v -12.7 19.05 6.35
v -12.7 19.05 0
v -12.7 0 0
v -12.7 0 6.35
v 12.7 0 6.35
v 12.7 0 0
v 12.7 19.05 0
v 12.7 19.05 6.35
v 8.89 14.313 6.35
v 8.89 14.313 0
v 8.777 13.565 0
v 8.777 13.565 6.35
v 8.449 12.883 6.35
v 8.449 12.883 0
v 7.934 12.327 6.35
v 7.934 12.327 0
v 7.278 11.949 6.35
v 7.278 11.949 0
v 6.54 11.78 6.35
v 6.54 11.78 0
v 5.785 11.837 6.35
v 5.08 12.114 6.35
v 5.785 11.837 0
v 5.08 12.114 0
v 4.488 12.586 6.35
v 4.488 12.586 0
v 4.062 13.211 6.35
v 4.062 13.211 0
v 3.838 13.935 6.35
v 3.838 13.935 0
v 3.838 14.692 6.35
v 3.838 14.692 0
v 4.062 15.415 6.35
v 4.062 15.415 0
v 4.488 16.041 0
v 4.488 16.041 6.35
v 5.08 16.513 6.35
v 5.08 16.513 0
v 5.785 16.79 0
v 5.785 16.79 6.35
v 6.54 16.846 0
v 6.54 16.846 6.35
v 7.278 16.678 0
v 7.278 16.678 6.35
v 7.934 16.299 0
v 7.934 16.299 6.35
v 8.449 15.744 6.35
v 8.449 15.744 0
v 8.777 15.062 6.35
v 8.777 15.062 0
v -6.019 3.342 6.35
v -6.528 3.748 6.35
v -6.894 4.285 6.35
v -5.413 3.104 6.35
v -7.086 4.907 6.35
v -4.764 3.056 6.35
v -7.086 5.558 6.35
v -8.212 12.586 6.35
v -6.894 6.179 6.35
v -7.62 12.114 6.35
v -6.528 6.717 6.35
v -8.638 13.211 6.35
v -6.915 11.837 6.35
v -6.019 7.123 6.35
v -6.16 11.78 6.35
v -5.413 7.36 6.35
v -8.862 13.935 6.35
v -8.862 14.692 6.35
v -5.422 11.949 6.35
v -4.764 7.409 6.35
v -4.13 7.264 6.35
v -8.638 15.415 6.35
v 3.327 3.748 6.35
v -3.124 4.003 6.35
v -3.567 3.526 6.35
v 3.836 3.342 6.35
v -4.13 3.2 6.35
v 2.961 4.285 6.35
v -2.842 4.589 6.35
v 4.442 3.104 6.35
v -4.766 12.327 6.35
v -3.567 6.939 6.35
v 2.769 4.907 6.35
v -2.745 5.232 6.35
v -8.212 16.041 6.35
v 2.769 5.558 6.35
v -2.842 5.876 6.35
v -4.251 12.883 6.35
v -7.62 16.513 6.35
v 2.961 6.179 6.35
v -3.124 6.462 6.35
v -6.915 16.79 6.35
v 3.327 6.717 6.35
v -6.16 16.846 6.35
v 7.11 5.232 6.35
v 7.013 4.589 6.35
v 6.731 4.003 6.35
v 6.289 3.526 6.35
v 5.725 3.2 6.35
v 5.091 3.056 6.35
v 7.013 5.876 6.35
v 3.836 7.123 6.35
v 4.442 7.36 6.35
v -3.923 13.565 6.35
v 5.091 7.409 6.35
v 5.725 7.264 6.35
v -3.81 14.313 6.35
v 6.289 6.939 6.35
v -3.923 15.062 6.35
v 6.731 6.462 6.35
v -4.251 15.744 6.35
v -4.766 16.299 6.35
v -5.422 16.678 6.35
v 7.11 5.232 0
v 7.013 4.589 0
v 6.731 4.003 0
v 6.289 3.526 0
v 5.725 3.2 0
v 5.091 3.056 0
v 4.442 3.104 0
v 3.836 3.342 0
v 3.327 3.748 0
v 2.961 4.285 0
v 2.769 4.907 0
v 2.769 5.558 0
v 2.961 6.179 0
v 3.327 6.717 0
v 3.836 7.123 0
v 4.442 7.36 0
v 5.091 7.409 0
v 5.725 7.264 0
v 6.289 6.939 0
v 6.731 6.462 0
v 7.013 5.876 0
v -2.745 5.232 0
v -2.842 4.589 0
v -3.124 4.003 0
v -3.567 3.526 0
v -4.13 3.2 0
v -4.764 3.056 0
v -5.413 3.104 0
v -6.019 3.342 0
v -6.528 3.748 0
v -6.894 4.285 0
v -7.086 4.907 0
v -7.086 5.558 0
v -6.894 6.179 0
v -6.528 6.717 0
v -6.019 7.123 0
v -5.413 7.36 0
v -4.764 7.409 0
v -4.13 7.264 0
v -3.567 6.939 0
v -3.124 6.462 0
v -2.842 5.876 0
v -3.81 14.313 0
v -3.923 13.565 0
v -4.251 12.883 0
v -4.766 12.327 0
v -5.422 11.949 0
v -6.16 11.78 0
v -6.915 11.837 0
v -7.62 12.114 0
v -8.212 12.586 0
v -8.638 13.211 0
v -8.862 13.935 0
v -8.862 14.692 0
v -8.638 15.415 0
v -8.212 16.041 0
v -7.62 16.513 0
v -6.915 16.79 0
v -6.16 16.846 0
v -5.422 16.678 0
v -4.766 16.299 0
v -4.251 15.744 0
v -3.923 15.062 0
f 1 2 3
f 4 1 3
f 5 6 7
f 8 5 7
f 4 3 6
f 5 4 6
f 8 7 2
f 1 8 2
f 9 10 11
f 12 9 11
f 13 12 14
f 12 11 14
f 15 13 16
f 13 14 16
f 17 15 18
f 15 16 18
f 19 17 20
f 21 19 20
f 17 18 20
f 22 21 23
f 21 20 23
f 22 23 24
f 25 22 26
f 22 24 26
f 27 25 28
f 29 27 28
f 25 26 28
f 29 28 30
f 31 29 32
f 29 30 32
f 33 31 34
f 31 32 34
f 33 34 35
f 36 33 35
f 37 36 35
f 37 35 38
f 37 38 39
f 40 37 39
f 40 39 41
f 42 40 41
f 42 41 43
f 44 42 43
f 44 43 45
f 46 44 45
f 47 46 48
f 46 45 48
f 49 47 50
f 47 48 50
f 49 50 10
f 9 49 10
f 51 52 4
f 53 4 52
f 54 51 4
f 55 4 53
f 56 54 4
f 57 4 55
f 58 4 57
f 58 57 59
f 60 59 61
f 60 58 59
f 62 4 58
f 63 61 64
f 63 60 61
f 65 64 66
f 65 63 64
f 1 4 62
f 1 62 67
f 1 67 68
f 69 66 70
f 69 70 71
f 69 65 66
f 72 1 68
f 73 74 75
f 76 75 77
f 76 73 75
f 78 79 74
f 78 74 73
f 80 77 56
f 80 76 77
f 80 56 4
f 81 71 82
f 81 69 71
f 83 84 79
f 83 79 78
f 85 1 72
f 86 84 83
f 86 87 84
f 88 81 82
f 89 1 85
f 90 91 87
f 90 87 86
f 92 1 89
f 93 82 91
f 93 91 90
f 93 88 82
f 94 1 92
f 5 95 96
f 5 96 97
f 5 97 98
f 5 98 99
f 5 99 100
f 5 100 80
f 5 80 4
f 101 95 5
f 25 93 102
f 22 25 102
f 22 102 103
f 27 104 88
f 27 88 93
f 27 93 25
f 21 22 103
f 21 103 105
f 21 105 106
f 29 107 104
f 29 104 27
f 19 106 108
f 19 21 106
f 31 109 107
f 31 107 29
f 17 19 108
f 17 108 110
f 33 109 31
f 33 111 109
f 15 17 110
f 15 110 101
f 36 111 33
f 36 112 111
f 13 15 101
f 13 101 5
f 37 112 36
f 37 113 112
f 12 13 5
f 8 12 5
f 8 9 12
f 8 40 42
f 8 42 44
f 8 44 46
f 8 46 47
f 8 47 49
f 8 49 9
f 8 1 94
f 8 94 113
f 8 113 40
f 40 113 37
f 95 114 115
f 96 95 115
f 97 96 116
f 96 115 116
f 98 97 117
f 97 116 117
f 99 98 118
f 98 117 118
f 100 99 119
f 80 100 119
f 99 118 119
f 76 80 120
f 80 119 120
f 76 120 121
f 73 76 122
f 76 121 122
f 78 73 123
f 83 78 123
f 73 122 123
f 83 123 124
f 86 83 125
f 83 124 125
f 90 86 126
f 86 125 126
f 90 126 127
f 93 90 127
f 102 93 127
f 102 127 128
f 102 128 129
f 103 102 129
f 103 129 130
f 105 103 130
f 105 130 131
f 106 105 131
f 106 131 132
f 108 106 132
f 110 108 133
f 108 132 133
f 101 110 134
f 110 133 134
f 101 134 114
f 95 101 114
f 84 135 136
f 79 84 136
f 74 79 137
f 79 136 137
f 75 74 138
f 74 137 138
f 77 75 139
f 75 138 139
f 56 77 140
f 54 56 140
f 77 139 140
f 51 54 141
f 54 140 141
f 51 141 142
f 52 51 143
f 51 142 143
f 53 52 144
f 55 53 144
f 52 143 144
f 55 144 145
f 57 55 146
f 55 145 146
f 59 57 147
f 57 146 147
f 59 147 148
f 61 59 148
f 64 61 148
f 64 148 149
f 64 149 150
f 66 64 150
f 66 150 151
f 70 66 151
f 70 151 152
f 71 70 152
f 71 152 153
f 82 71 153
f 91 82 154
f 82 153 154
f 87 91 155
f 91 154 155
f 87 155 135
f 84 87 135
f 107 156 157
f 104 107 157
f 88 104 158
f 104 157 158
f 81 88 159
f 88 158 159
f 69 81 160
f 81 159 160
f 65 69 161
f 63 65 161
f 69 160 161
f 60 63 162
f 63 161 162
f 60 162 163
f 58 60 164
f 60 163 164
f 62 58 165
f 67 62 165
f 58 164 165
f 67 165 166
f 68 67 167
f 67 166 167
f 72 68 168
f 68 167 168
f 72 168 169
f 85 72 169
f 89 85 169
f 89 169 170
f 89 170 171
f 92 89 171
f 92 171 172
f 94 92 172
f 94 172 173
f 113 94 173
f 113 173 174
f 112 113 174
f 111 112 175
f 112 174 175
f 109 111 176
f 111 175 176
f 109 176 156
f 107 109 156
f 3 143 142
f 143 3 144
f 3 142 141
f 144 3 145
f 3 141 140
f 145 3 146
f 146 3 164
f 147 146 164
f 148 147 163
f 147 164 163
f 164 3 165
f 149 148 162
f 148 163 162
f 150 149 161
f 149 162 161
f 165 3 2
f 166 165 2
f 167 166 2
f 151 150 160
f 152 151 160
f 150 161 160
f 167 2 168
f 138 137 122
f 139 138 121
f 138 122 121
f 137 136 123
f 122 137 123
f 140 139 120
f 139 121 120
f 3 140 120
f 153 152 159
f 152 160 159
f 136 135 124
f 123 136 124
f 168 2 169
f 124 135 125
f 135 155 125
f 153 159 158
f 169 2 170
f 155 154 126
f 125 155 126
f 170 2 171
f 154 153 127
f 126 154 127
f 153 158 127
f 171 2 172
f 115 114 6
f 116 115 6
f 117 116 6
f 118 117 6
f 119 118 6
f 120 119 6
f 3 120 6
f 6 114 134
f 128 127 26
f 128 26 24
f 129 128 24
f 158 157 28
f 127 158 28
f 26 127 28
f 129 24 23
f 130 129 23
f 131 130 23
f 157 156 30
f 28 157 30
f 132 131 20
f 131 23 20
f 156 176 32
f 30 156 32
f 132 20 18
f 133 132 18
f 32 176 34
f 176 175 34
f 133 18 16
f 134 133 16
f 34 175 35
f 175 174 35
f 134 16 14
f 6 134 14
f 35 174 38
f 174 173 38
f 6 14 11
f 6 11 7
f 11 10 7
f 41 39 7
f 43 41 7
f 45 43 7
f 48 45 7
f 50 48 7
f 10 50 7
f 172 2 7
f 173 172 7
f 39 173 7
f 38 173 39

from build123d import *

# Parameters (mm, degrees)
F1_DEPTH = 6.35


with BuildPart() as f1:
    # F0 (on Top) → F1 (new body)
    with BuildSketch(Plane.XY):
        with BuildLine():
            Line((12.7, 19.05), (-12.7, 19.05))
            Line((-12.7, 19.05), (-12.7, 14.313342981))
            Line((-12.7, 14.313342981), (-8.89, 14.313342981))
            ThreePointArc((-8.89, 14.313342981), (-6.35, 16.853342981), (-3.81, 14.313342981))
            Line((-3.81, 14.313342981), (3.81, 14.313342981))
            ThreePointArc((3.81, 14.313342981), (6.35, 16.853342981), (8.89, 14.313342981))
            Line((8.89, 14.313342981), (12.7, 14.313342981))
            Line((12.7, 14.313342981), (12.7, 19.05))
        make_face()
        with BuildLine():
            Line((-8.89, 14.313342981), (-12.7, 14.313342981))
            Line((-12.7, 14.313342981), (-12.7, 9.525))
            Line((-12.7, 9.525), (12.7, 9.525))
            Line((12.7, 9.525), (12.7, 14.313342981))
            Line((12.7, 14.313342981), (8.89, 14.313342981))
            ThreePointArc((8.89, 14.313342981), (6.35, 11.773342981), (3.81, 14.313342981))
            Line((3.81, 14.313342981), (-3.81, 14.313342981))
            ThreePointArc((-3.81, 14.313342981), (-6.35, 11.773342981), (-8.89, 14.313342981))
        make_face()
        with BuildLine():
            Line((12.7, 9.525), (-12.7, 9.525))
            Line((-12.7, 9.525), (-12.7, 5.2324))
            Line((-12.7, 5.2324), (-7.1104125, 5.2324))
            ThreePointArc((-7.1104125, 5.2324), (-4.9276, 7.4152125), (-2.7447875, 5.2324))
            Line((-2.7447875, 5.2324), (2.7447875, 5.2324))
            ThreePointArc((2.7447875, 5.2324), (4.9276, 7.4152125), (7.1104125, 5.2324))
            Line((7.1104125, 5.2324), (12.7, 5.2324))
            Line((12.7, 5.2324), (12.7, 9.525))
        make_face()
        with BuildLine():
            Line((-7.1104125, 5.2324), (-12.7, 5.2324))
            Line((-12.7, 5.2324), (-12.7, 0))
            Line((-12.7, 0), (12.7, 0))
            Line((12.7, 0), (12.7, 5.2324))
            Line((12.7, 5.2324), (7.1104125, 5.2324))
            ThreePointArc((7.1104125, 5.2324), (4.9276, 3.0495875), (2.7447875, 5.2324))
            Line((2.7447875, 5.2324), (-2.7447875, 5.2324))
            ThreePointArc((-2.7447875, 5.2324), (-4.9276, 3.0495875), (-7.1104125, 5.2324))
        make_face()
    extrude(amount=F1_DEPTH)


solid = f1.part
